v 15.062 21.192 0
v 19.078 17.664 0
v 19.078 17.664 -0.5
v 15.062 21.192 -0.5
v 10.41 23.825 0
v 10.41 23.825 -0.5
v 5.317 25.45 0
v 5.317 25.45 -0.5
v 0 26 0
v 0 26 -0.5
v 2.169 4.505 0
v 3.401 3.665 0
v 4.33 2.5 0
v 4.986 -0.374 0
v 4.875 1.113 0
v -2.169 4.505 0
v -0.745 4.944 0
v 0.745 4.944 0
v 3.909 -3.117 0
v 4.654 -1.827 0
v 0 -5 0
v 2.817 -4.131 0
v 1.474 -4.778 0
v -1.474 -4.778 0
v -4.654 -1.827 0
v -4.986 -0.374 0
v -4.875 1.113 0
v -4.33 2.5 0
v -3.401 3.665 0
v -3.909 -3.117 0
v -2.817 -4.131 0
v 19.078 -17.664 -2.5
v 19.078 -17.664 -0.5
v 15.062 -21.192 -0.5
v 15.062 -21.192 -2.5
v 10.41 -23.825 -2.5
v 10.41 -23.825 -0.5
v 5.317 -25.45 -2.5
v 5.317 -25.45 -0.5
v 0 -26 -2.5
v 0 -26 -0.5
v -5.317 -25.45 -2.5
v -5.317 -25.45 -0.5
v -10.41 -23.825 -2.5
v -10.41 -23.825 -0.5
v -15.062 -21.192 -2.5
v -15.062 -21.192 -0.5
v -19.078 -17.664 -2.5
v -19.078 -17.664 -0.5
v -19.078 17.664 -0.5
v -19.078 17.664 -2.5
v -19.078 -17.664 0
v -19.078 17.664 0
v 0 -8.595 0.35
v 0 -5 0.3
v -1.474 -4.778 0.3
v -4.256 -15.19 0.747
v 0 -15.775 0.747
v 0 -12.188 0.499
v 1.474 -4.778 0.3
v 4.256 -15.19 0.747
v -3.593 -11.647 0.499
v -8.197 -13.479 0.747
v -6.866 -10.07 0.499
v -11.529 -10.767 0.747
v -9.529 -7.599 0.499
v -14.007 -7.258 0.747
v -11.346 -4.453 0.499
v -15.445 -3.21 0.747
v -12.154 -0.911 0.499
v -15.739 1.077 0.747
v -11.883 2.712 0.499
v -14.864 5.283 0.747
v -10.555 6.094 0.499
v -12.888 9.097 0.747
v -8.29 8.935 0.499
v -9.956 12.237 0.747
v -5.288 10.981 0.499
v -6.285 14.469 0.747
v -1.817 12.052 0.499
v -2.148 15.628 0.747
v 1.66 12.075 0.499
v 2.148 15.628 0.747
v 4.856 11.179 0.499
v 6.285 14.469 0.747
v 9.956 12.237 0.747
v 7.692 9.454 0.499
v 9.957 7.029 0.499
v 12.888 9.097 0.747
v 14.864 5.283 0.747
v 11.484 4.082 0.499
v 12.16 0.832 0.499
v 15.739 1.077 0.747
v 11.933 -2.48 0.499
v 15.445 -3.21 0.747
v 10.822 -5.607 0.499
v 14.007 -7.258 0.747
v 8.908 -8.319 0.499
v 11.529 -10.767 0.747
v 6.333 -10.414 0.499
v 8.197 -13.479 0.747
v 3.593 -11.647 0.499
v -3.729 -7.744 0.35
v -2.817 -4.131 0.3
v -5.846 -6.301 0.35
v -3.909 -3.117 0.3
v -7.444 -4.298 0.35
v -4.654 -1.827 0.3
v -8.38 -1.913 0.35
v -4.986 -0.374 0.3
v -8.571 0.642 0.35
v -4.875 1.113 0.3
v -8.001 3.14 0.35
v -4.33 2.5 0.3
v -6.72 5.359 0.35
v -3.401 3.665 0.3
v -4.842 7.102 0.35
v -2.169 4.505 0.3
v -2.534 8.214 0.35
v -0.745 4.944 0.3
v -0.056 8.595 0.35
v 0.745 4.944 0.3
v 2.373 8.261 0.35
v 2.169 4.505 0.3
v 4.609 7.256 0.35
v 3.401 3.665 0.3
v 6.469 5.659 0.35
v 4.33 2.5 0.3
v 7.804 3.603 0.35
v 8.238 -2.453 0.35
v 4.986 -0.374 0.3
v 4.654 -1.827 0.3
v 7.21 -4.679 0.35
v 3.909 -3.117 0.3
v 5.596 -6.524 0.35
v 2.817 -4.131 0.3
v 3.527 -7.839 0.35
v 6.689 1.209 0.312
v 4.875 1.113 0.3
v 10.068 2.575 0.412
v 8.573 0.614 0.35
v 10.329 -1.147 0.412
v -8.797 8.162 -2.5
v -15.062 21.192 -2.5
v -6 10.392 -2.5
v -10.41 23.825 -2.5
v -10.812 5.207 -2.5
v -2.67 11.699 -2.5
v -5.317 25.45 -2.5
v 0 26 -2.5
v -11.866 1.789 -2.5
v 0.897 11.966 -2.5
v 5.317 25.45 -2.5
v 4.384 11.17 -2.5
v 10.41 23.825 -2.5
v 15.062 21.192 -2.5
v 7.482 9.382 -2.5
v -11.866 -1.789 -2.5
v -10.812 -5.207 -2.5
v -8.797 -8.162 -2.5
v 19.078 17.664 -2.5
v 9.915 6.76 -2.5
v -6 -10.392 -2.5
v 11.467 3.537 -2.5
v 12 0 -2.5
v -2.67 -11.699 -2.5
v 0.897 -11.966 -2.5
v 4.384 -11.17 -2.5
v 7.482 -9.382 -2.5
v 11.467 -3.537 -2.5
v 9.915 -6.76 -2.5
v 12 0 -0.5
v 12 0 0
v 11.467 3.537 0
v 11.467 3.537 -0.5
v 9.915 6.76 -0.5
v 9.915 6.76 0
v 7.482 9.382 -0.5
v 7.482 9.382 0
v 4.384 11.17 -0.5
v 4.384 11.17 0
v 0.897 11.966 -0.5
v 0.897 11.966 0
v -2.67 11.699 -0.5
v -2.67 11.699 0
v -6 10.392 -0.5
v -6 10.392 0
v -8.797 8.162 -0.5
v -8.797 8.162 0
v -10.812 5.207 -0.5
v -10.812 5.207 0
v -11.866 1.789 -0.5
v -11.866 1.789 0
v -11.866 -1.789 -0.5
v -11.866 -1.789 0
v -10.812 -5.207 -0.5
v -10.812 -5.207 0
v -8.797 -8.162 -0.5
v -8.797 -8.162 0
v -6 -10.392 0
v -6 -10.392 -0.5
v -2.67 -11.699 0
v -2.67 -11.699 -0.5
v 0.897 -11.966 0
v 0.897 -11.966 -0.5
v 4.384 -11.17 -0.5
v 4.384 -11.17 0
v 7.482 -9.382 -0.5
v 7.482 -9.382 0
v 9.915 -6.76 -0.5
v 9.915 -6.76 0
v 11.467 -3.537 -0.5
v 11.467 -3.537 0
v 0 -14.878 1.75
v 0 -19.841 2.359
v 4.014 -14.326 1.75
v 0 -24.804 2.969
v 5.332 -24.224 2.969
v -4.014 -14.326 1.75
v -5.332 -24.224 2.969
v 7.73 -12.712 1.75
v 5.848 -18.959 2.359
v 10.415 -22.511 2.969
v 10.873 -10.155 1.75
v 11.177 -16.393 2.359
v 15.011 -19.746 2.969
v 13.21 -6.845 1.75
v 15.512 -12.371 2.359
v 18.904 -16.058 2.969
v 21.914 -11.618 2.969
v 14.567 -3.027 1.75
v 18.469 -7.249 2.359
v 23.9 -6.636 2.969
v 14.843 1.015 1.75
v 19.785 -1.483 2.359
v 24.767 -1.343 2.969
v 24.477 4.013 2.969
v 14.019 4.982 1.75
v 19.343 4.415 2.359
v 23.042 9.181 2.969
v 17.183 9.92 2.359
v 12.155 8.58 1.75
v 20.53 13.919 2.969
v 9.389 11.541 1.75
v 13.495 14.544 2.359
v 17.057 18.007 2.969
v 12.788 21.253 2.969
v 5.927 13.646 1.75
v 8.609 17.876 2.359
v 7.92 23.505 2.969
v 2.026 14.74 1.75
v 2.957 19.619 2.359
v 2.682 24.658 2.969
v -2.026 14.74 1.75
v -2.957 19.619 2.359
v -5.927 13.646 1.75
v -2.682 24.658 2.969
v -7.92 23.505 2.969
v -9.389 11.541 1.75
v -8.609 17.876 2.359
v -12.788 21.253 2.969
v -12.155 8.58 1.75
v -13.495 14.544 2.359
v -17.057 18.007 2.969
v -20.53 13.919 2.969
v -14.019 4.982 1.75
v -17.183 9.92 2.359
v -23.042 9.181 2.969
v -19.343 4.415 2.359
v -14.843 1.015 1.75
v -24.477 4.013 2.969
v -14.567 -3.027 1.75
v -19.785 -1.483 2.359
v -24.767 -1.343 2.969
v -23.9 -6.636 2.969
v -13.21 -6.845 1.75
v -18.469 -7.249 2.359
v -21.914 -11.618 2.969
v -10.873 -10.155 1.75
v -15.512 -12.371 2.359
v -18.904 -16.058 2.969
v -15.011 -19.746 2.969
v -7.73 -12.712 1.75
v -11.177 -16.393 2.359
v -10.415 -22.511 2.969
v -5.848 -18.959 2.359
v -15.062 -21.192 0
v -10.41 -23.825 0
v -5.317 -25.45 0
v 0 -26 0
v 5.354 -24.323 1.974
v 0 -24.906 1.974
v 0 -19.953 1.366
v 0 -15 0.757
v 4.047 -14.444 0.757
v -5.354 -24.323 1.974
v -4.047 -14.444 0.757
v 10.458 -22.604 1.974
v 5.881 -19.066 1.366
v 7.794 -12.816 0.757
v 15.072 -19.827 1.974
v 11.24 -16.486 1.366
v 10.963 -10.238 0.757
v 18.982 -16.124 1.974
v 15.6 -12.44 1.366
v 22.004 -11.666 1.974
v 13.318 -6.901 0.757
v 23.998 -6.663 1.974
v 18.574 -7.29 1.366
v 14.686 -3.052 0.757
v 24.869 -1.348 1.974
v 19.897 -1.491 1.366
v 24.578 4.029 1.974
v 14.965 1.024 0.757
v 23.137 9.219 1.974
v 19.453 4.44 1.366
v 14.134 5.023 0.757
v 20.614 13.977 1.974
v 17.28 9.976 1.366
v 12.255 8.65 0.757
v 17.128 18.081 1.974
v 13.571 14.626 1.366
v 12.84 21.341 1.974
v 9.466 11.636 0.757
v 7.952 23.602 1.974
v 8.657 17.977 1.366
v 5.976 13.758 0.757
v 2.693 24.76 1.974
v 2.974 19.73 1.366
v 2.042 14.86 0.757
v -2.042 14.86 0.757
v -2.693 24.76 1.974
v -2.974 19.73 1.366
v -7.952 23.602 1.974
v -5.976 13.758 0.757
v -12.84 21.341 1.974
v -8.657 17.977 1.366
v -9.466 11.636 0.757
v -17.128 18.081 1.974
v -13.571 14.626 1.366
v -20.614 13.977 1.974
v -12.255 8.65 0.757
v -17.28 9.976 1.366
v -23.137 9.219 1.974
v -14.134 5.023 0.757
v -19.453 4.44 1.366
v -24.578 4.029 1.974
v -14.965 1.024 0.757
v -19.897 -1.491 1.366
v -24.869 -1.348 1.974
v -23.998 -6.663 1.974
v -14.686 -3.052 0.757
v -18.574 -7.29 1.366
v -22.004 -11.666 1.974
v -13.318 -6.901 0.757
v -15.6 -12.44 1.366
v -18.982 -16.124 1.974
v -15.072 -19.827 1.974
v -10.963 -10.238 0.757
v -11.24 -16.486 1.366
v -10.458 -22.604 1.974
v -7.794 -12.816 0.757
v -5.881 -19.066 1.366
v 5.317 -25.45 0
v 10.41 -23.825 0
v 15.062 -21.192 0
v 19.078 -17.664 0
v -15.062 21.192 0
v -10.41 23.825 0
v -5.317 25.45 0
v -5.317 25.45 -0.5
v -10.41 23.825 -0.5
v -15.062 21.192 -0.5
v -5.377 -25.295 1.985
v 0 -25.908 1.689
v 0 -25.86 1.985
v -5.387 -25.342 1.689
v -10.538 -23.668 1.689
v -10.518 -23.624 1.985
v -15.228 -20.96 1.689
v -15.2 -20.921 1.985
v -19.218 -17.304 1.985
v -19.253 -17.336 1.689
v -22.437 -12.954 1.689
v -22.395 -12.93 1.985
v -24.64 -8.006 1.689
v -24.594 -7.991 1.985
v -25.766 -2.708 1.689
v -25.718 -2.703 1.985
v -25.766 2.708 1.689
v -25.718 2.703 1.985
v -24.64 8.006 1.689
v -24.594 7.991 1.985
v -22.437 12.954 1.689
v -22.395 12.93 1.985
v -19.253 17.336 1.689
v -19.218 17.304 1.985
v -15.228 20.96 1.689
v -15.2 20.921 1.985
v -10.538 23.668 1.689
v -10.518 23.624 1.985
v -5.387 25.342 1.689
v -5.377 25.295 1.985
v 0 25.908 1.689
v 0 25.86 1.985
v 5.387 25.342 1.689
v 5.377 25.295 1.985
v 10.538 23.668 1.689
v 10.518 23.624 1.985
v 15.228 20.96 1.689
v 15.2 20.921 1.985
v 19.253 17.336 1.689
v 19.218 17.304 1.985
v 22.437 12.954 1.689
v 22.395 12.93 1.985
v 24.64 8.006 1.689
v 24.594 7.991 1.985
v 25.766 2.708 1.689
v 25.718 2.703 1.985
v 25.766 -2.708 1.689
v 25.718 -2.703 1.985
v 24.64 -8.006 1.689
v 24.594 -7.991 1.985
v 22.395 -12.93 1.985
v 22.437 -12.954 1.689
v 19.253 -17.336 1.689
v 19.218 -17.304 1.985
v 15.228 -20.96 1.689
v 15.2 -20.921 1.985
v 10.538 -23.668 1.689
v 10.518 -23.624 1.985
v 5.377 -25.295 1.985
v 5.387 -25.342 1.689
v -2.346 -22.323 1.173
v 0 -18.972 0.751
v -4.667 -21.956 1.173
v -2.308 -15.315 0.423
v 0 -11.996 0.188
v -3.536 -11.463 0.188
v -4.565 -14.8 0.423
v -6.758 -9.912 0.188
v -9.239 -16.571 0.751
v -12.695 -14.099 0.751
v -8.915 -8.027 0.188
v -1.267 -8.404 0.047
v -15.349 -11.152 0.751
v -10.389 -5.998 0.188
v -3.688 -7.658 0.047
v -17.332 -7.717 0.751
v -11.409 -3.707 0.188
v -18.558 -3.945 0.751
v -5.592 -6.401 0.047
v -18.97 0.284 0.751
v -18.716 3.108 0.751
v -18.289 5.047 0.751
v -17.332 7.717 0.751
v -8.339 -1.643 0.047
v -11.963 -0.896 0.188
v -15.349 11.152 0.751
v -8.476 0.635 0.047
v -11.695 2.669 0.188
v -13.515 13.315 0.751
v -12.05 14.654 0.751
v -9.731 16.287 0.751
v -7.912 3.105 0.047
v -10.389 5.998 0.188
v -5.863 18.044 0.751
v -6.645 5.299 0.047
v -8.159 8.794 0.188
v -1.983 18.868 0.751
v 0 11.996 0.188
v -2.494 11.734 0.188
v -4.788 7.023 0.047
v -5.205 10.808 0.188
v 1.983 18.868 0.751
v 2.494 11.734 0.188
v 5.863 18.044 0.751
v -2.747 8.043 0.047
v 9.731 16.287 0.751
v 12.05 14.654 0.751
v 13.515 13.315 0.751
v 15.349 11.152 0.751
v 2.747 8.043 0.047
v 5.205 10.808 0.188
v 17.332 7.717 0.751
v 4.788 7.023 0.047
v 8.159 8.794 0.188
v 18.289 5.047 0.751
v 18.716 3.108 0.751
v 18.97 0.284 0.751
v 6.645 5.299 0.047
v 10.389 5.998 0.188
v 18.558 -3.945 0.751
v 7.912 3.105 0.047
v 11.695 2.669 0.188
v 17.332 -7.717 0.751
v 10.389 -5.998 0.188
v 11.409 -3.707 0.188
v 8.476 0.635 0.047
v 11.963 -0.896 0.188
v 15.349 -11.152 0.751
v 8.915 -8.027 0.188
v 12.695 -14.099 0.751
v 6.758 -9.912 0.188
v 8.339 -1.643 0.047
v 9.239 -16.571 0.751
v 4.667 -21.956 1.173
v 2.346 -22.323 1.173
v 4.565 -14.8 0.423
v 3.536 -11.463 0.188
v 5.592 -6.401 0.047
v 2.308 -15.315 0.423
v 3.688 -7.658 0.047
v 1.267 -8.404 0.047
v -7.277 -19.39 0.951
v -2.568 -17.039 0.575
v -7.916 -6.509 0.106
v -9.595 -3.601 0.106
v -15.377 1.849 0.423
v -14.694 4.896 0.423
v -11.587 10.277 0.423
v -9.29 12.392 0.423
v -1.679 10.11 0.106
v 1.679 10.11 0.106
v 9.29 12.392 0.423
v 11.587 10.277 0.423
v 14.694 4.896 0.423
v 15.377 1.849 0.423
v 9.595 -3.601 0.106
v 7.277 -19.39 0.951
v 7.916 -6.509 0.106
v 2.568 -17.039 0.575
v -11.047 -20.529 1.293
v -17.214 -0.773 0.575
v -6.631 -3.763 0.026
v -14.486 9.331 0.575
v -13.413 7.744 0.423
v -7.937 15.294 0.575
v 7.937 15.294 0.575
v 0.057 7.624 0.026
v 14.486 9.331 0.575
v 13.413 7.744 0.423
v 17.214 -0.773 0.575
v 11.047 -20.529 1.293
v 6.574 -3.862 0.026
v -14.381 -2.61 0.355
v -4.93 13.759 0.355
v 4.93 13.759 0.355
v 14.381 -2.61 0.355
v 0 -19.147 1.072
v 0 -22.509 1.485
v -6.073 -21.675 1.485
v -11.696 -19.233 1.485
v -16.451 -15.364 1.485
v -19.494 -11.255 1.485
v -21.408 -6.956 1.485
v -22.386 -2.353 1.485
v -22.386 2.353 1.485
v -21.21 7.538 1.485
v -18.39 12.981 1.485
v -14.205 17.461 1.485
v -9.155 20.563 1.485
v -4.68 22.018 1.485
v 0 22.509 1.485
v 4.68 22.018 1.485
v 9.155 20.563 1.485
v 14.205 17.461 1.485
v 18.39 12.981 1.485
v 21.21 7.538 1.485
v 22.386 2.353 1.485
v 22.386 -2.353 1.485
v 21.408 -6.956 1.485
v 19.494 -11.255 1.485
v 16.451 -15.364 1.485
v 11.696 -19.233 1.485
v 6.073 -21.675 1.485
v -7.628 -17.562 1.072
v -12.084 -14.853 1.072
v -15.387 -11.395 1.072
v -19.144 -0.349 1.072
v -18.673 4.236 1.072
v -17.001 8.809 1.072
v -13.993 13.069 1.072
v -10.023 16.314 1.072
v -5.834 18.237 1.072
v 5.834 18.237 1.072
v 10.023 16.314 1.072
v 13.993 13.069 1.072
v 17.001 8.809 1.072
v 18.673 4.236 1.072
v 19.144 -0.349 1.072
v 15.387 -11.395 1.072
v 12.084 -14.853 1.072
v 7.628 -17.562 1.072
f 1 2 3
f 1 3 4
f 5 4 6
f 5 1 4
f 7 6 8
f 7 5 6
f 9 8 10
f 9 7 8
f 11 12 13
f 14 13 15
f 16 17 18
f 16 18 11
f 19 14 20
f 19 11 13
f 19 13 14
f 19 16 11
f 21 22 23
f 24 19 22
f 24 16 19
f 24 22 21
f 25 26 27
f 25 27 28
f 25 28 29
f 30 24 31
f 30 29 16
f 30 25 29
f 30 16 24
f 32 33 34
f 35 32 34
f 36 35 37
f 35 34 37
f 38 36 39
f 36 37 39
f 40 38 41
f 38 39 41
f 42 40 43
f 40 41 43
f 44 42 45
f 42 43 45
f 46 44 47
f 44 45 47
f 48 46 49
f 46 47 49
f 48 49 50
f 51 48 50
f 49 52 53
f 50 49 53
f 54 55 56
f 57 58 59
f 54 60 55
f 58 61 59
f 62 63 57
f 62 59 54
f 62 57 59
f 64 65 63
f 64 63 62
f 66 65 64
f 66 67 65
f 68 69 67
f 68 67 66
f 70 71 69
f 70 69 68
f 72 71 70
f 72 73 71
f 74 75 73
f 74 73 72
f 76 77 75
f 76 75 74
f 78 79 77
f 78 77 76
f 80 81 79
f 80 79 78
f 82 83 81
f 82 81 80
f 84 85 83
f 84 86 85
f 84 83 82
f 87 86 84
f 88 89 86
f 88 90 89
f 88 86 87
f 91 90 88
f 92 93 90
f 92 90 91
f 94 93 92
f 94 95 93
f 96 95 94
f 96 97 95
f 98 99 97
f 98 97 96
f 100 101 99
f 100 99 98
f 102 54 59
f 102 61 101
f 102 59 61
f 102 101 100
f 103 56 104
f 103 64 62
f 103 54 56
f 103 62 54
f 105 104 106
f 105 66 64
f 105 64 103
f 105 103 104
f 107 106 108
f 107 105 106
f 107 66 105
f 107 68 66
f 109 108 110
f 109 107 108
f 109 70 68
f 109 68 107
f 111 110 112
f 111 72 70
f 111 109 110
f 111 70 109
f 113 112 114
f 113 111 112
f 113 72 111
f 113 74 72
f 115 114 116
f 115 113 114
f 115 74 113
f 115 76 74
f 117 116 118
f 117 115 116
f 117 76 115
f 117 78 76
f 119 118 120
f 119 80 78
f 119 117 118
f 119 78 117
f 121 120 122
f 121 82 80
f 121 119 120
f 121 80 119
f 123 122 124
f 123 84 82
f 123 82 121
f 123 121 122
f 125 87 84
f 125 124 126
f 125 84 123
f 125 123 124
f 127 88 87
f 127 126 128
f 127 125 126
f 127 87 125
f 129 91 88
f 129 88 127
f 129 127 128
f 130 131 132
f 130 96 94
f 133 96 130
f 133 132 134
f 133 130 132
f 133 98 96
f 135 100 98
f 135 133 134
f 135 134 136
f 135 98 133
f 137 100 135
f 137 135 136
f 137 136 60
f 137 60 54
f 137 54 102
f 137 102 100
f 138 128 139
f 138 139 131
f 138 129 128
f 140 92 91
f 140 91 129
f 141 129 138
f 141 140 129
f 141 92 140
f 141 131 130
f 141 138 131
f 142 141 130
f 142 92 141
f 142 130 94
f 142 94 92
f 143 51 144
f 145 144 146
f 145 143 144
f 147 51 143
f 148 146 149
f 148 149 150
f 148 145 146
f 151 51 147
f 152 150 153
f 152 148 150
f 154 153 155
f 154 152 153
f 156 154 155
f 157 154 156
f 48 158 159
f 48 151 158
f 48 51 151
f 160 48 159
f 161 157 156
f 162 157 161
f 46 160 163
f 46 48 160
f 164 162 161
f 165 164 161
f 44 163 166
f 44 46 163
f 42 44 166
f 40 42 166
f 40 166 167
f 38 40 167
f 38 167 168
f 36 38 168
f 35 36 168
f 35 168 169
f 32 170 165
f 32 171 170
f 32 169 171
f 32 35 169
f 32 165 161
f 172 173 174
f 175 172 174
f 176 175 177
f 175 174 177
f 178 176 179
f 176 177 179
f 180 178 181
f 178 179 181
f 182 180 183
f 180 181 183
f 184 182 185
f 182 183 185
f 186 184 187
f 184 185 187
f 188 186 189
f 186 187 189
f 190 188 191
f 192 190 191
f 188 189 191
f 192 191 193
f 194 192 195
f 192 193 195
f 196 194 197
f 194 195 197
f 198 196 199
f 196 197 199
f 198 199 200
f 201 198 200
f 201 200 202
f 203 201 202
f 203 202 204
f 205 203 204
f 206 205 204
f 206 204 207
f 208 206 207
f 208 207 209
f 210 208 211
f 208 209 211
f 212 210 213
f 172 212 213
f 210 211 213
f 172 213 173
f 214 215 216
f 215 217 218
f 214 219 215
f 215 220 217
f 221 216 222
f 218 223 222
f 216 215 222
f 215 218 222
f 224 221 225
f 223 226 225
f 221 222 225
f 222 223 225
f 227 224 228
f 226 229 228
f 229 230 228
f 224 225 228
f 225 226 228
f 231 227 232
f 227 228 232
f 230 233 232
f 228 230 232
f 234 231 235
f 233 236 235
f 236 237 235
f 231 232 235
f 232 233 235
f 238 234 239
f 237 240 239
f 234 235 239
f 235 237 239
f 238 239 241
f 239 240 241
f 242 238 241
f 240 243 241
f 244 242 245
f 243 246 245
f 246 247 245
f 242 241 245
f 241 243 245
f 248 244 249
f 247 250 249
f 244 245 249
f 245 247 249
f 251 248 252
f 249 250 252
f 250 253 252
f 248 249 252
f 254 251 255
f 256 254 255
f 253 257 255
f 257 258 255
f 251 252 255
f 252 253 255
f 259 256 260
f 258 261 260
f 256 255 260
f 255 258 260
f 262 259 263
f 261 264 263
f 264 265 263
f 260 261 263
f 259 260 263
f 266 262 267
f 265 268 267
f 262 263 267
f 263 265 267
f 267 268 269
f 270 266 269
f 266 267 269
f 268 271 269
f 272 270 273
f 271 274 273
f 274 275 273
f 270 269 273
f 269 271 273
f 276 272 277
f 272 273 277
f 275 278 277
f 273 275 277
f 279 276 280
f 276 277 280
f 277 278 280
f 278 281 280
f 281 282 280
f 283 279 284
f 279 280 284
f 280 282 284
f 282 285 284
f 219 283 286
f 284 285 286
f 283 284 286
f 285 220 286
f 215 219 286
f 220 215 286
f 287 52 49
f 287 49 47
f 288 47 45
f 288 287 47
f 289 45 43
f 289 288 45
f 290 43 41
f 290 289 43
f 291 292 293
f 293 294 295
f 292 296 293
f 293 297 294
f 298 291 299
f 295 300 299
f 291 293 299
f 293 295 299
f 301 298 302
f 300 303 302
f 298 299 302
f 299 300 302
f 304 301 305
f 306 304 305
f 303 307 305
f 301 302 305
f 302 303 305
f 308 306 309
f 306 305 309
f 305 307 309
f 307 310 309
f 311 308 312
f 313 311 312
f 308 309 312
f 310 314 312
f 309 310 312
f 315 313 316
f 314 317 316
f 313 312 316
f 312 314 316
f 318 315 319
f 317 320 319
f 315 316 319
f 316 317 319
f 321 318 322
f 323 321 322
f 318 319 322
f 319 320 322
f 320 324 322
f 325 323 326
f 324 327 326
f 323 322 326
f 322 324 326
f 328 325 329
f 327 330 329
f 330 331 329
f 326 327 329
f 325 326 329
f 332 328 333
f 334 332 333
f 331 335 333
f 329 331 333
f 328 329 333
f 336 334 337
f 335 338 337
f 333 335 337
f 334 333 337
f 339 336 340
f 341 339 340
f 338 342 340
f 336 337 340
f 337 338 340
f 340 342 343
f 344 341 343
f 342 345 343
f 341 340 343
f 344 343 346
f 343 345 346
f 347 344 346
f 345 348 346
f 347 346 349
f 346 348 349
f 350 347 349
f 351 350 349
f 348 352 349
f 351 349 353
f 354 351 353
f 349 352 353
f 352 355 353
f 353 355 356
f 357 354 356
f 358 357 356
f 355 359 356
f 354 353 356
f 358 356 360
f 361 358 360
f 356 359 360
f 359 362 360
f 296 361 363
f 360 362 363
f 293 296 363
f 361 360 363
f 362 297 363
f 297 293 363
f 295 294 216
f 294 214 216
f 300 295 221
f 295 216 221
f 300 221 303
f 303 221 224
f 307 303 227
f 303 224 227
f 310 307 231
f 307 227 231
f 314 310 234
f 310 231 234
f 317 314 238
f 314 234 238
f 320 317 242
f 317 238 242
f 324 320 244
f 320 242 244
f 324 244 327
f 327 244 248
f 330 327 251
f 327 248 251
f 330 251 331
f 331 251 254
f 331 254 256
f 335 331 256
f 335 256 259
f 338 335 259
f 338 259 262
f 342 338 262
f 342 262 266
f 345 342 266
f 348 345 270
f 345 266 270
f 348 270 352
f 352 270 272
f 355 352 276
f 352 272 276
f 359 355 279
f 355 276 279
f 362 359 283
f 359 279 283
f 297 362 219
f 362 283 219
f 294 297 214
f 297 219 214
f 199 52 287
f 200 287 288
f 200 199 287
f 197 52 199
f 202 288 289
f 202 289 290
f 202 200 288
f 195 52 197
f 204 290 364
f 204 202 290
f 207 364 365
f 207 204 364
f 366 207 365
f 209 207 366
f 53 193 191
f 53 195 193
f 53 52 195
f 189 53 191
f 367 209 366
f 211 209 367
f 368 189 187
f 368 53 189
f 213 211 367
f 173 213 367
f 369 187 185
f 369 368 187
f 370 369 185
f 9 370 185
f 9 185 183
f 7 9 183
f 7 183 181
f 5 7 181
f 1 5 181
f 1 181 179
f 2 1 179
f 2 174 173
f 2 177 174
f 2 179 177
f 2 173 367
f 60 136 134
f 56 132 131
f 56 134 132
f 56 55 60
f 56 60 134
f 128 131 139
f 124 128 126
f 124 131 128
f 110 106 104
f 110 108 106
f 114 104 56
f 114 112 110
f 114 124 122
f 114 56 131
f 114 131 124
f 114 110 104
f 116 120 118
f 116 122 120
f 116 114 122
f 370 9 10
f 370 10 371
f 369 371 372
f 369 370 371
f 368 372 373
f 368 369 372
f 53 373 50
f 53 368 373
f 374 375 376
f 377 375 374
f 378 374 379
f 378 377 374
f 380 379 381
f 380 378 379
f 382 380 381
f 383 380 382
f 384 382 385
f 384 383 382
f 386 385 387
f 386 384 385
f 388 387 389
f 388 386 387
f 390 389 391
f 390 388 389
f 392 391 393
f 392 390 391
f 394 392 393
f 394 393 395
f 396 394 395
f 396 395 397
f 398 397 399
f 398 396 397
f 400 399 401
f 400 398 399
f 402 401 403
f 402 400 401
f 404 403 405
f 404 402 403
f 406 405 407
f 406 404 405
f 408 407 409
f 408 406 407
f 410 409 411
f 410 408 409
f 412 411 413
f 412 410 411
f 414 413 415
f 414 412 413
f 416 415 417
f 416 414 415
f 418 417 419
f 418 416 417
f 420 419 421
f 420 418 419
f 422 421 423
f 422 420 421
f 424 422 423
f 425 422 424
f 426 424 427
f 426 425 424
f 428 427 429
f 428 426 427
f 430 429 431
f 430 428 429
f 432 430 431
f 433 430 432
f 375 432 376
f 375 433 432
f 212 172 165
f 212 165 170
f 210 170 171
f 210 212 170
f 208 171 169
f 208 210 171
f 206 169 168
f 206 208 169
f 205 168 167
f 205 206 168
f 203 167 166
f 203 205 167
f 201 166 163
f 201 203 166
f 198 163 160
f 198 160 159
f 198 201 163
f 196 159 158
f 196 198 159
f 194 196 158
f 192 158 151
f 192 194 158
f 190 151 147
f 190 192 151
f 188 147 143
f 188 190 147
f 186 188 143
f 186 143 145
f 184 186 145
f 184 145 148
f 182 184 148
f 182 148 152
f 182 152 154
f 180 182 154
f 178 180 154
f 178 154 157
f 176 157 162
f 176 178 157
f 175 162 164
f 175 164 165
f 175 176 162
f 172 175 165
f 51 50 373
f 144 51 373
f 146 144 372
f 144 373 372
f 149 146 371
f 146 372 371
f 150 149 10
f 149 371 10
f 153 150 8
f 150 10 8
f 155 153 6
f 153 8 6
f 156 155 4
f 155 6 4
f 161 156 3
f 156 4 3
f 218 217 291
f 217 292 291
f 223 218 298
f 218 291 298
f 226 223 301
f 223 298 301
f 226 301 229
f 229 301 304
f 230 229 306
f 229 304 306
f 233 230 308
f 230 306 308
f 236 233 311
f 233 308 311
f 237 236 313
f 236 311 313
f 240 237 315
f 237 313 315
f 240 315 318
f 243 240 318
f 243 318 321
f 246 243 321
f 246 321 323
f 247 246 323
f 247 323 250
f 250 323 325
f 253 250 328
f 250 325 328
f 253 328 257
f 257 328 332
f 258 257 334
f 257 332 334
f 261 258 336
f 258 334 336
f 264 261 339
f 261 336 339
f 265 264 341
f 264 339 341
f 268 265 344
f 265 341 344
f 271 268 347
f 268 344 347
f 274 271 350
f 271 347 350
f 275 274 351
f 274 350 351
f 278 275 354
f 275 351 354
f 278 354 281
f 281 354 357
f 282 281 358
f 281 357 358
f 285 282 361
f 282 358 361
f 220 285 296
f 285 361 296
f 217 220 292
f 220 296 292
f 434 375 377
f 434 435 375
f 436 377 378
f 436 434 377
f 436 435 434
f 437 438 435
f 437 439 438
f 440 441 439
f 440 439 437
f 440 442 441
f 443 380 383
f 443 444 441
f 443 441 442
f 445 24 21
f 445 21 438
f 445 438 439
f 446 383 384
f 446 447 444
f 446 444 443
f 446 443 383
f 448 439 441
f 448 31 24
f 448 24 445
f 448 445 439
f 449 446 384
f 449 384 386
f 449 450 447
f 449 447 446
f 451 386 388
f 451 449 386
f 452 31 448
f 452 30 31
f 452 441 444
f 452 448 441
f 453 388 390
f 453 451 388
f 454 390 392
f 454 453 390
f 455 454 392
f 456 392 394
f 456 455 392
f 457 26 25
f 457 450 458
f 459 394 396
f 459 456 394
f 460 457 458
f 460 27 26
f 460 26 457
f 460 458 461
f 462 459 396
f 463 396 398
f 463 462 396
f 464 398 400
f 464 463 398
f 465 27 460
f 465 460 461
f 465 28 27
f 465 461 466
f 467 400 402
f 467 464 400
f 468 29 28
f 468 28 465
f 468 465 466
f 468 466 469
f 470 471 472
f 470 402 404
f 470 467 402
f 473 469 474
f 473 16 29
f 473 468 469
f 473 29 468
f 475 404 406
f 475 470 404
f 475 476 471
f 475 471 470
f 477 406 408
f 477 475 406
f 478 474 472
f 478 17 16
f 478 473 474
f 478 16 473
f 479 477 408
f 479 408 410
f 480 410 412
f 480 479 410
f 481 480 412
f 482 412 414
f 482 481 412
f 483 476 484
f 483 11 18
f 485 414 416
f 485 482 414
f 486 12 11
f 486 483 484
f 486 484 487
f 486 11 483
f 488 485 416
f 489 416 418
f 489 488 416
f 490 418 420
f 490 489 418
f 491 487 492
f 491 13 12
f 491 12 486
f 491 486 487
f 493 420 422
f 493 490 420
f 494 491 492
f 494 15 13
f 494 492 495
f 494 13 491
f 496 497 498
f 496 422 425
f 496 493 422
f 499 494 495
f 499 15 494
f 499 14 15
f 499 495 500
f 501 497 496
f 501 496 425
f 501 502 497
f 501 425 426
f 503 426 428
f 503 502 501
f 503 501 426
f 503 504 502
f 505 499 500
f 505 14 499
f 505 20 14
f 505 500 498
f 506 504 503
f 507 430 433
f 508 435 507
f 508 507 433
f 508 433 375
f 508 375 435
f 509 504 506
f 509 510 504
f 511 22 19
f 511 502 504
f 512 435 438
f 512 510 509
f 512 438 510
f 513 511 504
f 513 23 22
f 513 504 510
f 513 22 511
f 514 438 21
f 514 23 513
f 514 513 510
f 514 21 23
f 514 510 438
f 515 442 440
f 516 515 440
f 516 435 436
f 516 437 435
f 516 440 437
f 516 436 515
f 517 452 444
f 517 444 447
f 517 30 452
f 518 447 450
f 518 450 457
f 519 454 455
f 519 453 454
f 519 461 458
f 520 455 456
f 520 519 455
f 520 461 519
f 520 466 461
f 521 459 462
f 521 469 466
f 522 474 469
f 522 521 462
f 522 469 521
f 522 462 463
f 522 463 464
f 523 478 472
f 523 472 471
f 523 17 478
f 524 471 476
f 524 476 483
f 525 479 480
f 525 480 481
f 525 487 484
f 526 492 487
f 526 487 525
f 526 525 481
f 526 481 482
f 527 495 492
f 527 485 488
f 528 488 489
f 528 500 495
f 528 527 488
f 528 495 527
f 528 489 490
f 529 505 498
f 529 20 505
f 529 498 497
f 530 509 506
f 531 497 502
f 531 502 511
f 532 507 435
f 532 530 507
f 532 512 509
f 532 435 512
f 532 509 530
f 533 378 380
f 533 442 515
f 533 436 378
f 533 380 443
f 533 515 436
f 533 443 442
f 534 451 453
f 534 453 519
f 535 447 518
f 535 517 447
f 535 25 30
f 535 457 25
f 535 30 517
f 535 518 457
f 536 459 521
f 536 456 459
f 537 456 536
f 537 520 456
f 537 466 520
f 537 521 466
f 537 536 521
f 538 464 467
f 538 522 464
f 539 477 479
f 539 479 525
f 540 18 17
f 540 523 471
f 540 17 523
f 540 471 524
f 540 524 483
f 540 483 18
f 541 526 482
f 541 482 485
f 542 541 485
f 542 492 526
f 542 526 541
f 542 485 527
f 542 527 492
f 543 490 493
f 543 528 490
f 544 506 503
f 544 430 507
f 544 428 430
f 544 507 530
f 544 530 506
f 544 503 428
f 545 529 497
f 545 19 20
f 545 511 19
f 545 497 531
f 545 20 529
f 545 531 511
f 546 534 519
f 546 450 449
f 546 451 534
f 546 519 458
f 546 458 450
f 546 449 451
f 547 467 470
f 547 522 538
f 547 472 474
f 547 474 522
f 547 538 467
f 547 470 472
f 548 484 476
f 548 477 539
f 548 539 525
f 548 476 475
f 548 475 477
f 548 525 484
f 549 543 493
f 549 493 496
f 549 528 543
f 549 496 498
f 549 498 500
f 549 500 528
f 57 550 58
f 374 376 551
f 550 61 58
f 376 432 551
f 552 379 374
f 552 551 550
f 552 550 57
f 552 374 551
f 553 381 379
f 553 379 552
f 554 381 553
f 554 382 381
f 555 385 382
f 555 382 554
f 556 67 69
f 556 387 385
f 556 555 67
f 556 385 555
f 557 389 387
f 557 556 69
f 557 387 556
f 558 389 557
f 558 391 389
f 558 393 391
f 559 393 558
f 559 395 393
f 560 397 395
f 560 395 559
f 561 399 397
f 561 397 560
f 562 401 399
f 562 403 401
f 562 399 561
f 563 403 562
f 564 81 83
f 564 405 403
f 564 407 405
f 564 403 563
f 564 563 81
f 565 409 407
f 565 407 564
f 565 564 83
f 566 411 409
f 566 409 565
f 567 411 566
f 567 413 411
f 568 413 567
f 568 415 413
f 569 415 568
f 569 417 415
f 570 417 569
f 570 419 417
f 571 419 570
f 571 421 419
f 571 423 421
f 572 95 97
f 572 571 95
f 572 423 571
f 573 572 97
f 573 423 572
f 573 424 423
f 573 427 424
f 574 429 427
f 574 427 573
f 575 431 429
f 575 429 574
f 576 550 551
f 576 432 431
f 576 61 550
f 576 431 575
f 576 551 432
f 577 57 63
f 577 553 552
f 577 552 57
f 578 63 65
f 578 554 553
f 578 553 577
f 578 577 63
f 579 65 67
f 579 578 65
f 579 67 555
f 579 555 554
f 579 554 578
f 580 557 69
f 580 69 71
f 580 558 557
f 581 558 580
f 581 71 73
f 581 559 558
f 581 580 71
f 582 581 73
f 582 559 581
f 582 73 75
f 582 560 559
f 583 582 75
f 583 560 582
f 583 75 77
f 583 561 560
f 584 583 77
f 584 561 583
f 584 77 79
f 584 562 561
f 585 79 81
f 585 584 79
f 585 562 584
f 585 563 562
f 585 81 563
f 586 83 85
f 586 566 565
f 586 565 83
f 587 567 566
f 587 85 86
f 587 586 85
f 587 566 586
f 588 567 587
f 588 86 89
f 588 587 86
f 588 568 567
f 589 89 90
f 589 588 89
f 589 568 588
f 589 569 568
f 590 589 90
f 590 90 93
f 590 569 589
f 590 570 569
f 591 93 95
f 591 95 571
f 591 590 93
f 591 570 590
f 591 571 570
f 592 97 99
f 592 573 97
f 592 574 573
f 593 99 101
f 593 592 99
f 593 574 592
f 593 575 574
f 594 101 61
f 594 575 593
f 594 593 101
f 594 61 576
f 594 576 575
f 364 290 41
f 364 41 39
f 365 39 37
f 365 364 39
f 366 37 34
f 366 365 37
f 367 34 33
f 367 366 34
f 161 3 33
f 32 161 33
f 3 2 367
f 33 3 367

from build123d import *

# Parameters (mm, degrees)
F1_R      = 12
F2_DEPTH  = 0.5
F2_FACE_R = 12
F3_DEPTH  = 2


with BuildPart() as f2:
    # F1 (on Top) → F2 (new body)
    with BuildSketch(Plane.XY):
        with BuildLine():
            ThreePointArc((19.07828, 17.664066), (10.409954, 23.825047), (0, 26))
            ThreePointArc((0, 26), (-10.409954, 23.825047), (-19.07828, 17.664066))
            Line((-19.07828, 17.664066), (-19.07828, 0))
            Line((-19.07828, 0), (-19.07828, -17.664066))
            ThreePointArc((-19.07828, -17.664066), (-10.409954, -23.825047), (0, -26))
            ThreePointArc((0, -26), (10.409954, -23.825047), (19.07828, -17.664066))
            Line((19.07828, -17.664066), (19.07828, 0))
            Line((19.07828, 0), (19.07828, 17.664066))
        make_face()
        Circle(F1_R, mode=Mode.SUBTRACT)
    extrude(amount=-F2_DEPTH)

    # F2_face (on face) → F3 (join)
    with BuildSketch(Plane(origin=(0, 0, -0.5), x_dir=(1, 0, 0), z_dir=(0, 0, -1))):
        with BuildLine():
            ThreePointArc((-19.07828, -17.664066), (0, -26), (19.07828, -17.664066))
            Line((19.07828, -17.664066), (19.07828, 17.664066))
            ThreePointArc((19.07828, 17.664066), (0, 26), (-19.07828, 17.664066))
            Line((-19.07828, 17.664066), (-19.07828, -17.664066))
        make_face()
        Circle(F2_FACE_R, mode=Mode.SUBTRACT)
    extrude(amount=F3_DEPTH)


with BuildPart() as f5:
    # F4 (on Right) → F5 (revolve)
    with BuildSketch(Plane.YZ):
        with BuildLine():
            Line((0, 0), (0, 0.3))
            Line((0, 0.3), (-5, 0.3))
            ThreePointArc((-5, 0.3), (-10.392303, 0.41189), (-15.775324, 0.747368))
            ThreePointArc((-15.775324, 0.747368), (-20.829663, 1.267428), (-25.859817, 1.984614))
            Line((-25.859817, 1.984614), (-25.907958, 1.688502))
            ThreePointArc((-25.907958, 1.688502), (-15.488014, 0.422811), (-5, 0))
            Line((-5, 0), (0, 0))
        make_face()
    revolve(axis=Axis((0, 0, 1.302655), (0, 0, -1)))


with BuildPart() as f7:
    # F6 (on Right) → F7 (revolve)
    with BuildSketch(Plane.YZ):
        Polygon((-24.803636, 2.968541), (-24.90564, 1.973757), (-15, 0.757497), (-14.87815, 1.750045), align=None)
    revolve(axis=Axis((0, 0, 0.451372), (0, 0, 1)))


solid = Compound([f2.part, f5.part, f7.part])
